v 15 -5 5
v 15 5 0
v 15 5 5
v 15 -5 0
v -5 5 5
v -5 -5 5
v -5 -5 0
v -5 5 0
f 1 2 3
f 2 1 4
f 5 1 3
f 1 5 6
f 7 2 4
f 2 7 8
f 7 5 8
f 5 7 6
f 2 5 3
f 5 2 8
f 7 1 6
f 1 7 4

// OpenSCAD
$fn = 50;


difference() {
	union() {
		translate(v = [-5.0000000000, -5.0000000000, 0]) {
			cube(size = [20, 10, 5]);
		}
	}
	union();
}
